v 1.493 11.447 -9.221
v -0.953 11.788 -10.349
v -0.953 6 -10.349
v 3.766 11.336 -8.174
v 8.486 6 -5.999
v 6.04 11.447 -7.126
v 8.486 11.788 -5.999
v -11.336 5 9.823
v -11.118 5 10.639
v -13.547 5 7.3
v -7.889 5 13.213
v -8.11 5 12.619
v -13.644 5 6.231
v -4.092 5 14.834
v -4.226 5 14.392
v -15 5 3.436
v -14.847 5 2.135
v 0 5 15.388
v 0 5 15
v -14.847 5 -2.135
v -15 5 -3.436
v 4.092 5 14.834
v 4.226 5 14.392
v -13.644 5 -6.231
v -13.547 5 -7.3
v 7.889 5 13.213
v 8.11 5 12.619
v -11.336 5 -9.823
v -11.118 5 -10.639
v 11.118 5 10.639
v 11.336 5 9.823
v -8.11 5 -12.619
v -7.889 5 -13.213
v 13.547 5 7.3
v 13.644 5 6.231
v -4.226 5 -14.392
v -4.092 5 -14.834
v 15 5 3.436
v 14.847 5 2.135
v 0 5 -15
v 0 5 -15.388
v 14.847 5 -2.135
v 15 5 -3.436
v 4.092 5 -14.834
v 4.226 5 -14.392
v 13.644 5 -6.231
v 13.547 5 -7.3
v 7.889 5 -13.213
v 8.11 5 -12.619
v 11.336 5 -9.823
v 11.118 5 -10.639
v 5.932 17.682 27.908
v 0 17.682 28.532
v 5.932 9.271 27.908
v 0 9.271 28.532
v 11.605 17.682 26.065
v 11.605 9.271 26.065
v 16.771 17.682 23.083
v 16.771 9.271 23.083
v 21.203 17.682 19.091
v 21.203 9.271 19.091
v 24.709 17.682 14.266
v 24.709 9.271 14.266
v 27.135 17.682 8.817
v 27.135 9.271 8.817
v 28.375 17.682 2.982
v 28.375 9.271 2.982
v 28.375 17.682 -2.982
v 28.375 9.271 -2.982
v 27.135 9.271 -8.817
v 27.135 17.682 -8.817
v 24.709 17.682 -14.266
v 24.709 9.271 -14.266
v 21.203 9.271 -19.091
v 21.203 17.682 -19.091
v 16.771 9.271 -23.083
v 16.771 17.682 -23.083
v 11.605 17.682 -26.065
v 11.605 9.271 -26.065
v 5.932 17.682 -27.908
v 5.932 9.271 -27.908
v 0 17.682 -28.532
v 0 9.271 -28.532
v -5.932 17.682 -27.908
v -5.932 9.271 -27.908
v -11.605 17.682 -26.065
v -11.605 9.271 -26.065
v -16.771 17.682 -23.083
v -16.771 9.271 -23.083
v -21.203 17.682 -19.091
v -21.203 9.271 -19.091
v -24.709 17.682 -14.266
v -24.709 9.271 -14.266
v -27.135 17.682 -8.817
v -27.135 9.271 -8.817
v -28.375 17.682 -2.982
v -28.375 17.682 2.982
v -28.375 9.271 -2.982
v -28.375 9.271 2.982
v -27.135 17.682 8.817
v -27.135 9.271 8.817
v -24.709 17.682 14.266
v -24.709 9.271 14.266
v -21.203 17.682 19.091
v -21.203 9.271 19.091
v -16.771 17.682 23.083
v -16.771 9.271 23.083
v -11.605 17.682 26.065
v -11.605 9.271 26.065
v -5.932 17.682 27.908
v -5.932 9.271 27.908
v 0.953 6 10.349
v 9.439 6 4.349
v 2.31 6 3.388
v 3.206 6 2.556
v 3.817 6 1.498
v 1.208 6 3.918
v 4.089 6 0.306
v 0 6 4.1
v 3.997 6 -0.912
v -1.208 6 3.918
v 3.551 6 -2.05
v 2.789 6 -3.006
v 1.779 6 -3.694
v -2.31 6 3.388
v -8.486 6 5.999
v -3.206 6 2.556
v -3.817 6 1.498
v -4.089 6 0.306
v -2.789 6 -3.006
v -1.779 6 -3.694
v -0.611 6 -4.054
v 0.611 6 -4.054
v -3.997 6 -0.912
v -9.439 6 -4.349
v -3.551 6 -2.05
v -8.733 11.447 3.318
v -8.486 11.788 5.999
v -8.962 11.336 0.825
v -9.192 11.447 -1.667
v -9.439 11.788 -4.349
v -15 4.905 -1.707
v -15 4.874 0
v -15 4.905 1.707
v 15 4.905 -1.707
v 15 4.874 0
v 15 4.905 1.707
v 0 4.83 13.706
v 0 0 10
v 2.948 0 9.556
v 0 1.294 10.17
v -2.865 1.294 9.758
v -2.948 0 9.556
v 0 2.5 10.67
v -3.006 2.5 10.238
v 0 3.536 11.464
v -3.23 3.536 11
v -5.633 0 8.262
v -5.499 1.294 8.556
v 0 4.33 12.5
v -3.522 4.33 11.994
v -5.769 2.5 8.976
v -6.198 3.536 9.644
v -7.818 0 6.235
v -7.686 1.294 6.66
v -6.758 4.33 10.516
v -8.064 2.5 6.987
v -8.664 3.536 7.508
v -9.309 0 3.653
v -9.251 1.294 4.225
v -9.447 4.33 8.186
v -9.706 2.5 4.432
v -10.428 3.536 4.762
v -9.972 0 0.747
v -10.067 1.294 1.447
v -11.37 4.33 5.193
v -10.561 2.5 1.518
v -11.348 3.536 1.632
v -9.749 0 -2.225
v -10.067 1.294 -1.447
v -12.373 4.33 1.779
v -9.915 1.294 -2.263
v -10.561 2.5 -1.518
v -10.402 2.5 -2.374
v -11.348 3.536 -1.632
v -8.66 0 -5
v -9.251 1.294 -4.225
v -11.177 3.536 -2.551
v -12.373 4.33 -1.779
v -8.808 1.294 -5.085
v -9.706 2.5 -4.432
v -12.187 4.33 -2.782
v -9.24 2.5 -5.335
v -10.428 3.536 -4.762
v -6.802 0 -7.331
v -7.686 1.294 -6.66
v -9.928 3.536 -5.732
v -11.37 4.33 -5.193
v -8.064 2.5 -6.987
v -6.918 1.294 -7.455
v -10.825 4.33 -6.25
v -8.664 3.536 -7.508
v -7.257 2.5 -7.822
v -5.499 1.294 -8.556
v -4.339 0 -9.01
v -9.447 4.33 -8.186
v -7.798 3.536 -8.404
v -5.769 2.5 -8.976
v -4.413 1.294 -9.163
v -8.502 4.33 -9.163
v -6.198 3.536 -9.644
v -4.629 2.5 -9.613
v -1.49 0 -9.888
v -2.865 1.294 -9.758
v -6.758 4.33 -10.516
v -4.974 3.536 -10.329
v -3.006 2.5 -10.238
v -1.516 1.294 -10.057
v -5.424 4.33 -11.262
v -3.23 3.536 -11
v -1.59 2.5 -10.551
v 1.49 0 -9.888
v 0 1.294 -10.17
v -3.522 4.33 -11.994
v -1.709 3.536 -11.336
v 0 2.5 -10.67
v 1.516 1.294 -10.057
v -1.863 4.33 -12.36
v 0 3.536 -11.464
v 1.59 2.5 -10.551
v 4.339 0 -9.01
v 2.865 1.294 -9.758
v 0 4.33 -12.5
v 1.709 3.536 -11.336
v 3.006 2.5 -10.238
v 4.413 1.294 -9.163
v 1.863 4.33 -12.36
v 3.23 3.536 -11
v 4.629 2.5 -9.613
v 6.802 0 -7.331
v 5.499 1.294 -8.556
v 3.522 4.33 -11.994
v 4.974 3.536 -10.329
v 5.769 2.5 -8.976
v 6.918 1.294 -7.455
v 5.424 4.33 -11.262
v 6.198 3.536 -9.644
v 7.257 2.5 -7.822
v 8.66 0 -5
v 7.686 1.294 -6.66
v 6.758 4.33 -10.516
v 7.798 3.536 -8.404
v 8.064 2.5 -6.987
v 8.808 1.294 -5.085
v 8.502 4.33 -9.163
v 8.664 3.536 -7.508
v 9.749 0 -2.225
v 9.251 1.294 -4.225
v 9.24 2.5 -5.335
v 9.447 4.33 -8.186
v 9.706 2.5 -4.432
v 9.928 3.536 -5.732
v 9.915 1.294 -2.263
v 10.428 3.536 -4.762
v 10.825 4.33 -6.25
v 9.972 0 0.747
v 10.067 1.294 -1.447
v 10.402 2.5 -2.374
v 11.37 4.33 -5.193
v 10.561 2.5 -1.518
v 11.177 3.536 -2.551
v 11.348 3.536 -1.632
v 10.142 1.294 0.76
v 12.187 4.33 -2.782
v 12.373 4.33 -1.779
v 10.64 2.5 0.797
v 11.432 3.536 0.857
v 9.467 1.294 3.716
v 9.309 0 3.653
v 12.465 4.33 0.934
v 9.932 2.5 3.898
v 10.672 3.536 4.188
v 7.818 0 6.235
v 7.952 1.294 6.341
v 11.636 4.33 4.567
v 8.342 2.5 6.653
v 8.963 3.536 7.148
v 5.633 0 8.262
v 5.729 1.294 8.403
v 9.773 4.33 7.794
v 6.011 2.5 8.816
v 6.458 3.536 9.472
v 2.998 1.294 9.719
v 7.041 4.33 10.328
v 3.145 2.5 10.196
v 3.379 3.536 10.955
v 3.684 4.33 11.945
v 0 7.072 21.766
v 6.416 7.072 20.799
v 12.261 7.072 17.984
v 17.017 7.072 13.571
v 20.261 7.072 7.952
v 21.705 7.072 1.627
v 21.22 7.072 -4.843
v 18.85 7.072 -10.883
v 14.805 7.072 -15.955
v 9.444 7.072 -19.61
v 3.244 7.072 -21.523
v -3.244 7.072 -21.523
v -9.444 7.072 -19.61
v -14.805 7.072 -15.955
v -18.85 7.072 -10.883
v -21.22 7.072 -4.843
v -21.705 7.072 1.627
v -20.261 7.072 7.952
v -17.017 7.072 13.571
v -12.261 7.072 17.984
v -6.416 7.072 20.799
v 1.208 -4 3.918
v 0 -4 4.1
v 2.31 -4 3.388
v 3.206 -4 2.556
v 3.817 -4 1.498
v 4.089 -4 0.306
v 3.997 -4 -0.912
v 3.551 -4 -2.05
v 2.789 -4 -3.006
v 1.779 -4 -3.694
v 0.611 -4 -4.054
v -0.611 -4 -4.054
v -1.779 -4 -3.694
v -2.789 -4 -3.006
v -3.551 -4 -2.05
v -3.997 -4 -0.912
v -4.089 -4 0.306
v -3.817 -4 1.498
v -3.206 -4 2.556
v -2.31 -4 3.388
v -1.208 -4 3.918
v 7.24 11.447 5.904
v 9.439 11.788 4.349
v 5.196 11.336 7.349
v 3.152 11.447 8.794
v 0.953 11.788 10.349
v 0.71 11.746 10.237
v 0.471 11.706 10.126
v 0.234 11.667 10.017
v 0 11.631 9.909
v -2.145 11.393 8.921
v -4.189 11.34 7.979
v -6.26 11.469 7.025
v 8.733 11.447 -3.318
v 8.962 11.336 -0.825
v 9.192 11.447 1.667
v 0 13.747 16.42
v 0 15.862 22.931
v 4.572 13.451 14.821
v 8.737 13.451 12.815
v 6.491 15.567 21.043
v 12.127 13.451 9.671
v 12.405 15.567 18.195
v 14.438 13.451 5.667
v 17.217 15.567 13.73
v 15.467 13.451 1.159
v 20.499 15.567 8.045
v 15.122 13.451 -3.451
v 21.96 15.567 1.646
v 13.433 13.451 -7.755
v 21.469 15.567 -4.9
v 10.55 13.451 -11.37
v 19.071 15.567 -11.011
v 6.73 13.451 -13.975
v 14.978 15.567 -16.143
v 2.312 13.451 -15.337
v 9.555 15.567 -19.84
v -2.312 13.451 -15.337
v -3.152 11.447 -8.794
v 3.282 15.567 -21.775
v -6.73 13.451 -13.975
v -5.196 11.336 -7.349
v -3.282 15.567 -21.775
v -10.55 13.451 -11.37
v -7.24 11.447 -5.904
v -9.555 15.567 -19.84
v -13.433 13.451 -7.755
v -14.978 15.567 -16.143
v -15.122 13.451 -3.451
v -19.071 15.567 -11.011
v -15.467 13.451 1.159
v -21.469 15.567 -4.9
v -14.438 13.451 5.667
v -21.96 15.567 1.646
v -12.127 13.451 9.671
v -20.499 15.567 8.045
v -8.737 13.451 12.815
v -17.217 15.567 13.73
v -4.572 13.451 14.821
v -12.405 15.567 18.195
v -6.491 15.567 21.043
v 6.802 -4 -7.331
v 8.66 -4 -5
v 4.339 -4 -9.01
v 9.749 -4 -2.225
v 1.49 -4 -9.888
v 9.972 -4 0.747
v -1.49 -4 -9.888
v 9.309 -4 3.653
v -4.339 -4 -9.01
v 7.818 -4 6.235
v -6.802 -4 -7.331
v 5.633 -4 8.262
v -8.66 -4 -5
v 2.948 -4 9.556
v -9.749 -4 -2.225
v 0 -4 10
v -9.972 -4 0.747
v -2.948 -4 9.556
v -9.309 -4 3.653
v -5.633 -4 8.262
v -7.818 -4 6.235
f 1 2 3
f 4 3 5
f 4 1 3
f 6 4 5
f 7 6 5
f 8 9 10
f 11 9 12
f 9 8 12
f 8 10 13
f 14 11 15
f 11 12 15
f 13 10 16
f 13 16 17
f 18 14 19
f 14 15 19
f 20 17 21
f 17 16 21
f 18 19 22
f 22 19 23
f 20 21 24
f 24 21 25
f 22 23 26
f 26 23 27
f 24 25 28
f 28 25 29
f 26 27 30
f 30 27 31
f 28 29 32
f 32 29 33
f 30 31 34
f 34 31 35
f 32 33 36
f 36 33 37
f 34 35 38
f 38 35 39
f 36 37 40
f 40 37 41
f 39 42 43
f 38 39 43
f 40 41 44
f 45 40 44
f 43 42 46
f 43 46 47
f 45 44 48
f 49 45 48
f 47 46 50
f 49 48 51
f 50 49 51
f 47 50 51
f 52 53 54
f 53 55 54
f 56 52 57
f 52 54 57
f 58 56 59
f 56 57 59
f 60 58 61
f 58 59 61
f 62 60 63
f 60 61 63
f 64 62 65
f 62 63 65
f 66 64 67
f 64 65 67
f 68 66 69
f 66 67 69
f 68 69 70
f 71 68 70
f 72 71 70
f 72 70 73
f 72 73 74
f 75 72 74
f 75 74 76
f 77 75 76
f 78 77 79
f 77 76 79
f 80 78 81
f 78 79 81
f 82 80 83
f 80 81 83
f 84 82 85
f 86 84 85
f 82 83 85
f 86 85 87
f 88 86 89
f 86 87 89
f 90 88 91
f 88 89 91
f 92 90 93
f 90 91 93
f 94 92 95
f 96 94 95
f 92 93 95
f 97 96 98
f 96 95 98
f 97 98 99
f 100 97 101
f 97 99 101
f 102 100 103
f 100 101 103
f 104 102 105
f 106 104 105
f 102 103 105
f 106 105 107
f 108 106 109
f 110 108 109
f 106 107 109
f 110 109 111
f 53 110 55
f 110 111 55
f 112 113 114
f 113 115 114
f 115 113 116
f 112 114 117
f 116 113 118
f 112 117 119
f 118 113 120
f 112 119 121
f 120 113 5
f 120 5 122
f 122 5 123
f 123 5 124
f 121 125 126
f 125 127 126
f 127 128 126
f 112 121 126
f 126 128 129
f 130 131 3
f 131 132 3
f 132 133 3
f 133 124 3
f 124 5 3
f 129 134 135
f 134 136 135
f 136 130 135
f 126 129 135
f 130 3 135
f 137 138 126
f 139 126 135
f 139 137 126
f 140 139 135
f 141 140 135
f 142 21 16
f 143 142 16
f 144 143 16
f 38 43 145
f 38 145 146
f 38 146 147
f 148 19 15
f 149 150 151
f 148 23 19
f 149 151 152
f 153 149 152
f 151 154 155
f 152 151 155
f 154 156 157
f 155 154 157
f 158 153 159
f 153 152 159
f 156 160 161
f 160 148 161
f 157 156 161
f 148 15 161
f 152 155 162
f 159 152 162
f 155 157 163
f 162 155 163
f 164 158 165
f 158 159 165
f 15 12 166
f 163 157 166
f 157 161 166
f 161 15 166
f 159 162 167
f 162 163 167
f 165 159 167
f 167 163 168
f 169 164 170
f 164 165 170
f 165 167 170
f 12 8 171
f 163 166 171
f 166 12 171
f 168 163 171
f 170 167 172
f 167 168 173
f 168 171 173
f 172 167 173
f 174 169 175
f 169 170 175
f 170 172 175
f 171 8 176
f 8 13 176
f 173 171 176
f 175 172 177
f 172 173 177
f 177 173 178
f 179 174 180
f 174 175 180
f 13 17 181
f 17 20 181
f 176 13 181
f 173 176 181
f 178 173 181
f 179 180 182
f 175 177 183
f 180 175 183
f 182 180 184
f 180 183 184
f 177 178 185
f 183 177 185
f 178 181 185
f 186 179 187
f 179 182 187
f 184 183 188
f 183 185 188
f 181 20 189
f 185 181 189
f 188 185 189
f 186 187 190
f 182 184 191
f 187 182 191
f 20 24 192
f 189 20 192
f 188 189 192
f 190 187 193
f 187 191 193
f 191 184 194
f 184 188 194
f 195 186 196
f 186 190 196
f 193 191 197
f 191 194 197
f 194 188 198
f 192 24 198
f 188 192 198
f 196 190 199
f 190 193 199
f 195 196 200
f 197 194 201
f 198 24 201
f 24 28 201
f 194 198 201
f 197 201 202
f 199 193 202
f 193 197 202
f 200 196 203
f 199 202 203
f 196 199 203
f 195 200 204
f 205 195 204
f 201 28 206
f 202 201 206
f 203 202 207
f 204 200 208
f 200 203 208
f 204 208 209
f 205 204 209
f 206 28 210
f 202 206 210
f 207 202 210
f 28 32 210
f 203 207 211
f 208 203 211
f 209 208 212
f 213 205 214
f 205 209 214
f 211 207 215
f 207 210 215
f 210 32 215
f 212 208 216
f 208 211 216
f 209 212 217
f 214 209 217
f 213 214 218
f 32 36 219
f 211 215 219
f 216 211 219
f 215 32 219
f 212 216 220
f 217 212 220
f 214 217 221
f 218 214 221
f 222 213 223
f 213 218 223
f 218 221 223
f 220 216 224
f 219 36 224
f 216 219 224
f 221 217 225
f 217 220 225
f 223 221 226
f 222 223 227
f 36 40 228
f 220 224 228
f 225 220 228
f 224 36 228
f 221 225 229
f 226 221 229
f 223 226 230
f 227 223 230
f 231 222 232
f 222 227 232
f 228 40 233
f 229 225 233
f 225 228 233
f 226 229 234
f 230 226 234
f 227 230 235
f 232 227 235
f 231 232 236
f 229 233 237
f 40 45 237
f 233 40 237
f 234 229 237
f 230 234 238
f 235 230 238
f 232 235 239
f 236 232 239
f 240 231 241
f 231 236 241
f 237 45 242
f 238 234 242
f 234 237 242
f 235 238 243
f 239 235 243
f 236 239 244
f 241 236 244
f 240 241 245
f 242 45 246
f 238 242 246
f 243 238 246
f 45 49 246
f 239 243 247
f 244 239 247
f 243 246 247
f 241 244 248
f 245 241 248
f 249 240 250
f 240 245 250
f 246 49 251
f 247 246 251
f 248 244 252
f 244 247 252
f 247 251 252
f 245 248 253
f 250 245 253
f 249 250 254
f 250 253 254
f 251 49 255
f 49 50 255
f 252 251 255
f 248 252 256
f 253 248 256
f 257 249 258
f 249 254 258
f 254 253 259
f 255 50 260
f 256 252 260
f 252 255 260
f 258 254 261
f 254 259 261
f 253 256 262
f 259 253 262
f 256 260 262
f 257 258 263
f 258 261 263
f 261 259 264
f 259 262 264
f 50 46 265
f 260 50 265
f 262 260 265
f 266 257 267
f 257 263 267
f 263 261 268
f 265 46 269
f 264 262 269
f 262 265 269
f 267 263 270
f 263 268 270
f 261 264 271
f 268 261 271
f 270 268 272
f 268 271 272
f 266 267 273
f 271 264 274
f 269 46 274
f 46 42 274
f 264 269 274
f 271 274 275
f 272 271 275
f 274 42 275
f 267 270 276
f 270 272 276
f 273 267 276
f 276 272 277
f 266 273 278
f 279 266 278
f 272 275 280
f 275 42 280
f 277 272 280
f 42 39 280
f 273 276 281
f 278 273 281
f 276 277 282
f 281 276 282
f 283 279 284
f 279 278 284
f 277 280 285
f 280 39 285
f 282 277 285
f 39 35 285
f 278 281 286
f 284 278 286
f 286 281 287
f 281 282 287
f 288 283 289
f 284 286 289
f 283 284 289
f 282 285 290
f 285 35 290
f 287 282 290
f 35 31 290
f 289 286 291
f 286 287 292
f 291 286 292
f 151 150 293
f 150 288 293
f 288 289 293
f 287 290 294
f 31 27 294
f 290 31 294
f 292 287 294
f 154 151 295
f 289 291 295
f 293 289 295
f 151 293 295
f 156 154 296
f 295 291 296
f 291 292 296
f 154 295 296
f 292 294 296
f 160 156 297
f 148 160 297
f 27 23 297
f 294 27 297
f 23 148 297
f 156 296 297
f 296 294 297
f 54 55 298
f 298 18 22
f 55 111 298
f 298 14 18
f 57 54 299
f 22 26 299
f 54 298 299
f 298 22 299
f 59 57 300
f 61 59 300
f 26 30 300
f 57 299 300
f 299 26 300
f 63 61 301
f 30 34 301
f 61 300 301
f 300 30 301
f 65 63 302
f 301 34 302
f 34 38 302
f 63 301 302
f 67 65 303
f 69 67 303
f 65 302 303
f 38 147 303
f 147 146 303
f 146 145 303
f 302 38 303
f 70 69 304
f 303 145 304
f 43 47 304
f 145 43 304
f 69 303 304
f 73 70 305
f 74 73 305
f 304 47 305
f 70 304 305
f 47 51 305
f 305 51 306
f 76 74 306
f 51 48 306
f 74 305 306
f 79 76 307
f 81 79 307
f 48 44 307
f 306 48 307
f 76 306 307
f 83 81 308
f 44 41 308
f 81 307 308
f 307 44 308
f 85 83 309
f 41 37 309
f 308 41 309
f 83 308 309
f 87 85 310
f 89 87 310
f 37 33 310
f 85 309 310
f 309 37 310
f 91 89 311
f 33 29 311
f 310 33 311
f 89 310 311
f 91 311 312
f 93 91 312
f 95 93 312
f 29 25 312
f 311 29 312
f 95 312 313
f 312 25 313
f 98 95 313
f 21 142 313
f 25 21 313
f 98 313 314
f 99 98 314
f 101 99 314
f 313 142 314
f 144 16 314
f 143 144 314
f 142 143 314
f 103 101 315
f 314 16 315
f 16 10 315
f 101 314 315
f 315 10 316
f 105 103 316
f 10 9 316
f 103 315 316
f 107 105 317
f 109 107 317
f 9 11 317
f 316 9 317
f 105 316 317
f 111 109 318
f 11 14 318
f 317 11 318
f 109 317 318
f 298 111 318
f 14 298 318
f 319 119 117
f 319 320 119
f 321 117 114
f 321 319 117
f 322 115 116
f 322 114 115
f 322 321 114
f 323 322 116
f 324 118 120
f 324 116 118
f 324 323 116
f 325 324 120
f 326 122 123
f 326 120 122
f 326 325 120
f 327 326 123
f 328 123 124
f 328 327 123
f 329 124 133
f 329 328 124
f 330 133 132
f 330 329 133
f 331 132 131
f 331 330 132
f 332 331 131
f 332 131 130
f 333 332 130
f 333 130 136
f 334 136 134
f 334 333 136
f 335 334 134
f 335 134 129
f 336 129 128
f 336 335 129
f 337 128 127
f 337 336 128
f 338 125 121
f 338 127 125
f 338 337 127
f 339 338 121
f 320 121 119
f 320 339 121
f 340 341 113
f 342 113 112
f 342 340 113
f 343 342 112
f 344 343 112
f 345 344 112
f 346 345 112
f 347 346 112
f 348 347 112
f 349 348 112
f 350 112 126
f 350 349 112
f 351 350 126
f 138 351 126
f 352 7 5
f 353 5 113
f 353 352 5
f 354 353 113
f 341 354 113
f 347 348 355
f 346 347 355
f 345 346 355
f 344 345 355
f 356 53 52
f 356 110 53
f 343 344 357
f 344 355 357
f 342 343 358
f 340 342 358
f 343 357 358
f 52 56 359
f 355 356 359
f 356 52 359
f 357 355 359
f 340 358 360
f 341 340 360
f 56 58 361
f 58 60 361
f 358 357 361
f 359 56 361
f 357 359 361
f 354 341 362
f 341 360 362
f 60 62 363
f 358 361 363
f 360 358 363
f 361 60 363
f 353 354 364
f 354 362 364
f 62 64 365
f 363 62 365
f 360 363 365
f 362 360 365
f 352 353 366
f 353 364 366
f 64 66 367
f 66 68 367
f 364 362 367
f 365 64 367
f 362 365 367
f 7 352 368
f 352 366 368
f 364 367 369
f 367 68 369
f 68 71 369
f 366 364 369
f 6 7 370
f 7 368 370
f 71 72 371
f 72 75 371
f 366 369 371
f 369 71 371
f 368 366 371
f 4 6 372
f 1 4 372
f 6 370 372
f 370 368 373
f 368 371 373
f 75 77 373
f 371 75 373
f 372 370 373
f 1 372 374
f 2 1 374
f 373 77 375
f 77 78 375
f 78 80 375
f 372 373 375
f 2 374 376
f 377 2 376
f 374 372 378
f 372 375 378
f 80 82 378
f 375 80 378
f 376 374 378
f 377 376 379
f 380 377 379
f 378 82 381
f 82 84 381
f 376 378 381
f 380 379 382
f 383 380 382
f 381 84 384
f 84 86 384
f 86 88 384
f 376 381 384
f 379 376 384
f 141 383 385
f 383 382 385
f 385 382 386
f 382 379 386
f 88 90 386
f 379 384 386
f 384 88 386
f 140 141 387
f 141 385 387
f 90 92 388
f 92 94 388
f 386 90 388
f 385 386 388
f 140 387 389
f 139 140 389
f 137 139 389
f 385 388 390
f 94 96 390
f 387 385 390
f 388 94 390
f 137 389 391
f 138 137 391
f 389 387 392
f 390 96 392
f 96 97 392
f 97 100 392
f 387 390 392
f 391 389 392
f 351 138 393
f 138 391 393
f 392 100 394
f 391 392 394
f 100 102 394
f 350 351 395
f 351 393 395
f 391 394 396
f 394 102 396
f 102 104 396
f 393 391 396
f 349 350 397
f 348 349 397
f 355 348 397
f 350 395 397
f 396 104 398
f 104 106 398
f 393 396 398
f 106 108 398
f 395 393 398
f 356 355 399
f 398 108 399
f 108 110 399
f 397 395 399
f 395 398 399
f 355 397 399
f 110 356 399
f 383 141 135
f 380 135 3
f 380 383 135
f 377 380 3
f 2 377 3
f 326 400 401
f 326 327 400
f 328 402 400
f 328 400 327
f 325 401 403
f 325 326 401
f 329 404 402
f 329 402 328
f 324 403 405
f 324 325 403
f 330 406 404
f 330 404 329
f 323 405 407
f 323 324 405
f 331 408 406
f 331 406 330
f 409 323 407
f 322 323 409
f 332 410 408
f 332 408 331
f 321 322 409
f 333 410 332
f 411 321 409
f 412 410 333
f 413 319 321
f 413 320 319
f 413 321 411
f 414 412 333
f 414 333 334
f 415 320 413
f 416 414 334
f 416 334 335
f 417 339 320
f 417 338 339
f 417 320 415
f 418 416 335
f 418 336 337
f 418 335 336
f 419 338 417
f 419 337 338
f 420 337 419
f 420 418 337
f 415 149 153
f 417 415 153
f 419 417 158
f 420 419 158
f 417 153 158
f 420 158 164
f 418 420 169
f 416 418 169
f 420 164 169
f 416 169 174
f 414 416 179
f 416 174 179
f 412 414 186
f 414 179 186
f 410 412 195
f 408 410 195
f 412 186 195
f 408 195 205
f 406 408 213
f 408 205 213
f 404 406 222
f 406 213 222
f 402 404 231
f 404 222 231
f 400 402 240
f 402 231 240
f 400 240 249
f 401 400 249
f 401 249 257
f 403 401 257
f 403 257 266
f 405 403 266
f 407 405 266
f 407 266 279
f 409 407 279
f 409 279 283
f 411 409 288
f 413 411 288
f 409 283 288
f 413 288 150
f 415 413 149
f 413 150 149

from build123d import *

# Parameters (mm, degrees)
CUT_EXTRUDE_1_DEPTH      = 45.054236589
CUT_EXTRUDE_1_DEPTH_BACK = 45.054236589
SKETCH_2_W               = 30
SKETCH_2_H               = 10
SKETCH_3_R               = 3
CUT_EXTRUDE_2_DEPTH      = 43.296024461
SKETCH_5_R               = 10
EXTRUDE_1_DEPTH          = 9
CUT_EXTRUDE_7_DEPTH      = 43.296024461
CUT_EXTRUDE_7_DEPTH_BACK = 43.296024461
SKETCH_6_R               = 4.1
FILLET_2_R               = 5
CUT_EXTRUDE_8_DEPTH      = 4
CUT_EXTRUDE_8_DEPTH_BACK = 12


with BuildPart() as part:
    # 草图1 → 旋转2 (revolve)
    with BuildSketch(Plane.XY, mode=Mode.PRIVATE) as revolve_2_sk:
        Polygon((0, 0), (0, 8.411697794), (28.531695489, 17.682207625), (28.531695489, 9.270509831), align=None)
    revolve(revolve_2_sk.sketch.rotate(Axis((0, 0, 0), (0, 1, 0)), 270), axis=Axis((0, 0, 0), (0, 1, 0)))

    # 草图2 → 切除-拉伸1 (cut, two sides: drawn at the far end of the back side and taken through both)
    with BuildSketch(Plane.XY.offset(-CUT_EXTRUDE_1_DEPTH_BACK)):
        Rectangle(SKETCH_2_W, SKETCH_2_H)
    extrude(amount=CUT_EXTRUDE_1_DEPTH + CUT_EXTRUDE_1_DEPTH_BACK, mode=Mode.SUBTRACT)

    # 草图3 → 切除-拉伸2 (cut, through all)
    with BuildSketch(Plane.XZ.offset(-5)):
        with Locations(Location((0, 0, 0), (0, 0, 270))):
            Circle(SKETCH_3_R)
    extrude(amount=-CUT_EXTRUDE_2_DEPTH, mode=Mode.SUBTRACT)

    # 草图5 → 凸台-拉伸1 (add)
    with BuildSketch(Plane.XZ.offset(-5)):
        with Locations(Location((0, 0, 0), (0, 0, 90))):
            Circle(SKETCH_5_R)
    extrude(amount=EXTRUDE_1_DEPTH)

    # 草图6 → 切除-拉伸7 (cut, two sides: drawn at the far end of the back side and taken through both)
    with BuildSketch(Plane(origin=(0, 5, 0), x_dir=(1, 0, 0), z_dir=(0, 1, 0)).offset(-CUT_EXTRUDE_7_DEPTH_BACK)):
        with Locations(Location((0, 0, 0), (0, 0, 270))):
            Circle(SKETCH_6_R)
    extrude(amount=CUT_EXTRUDE_7_DEPTH + CUT_EXTRUDE_7_DEPTH_BACK, mode=Mode.SUBTRACT)

    # 圆角2
    fillet_2_edges = [part.edges().sort_by_distance(p)[0] for p in [
        (0, 5, -10),
    ]]
    fillet(fillet_2_edges, radius=FILLET_2_R - 0.0001)  # a hair under: the kernel refuses the full size

    # 草图9 → 切除-拉伸8 (cut, two sides: drawn at the far end of the back side and taken through both)
    with BuildSketch(Plane(origin=(0, 10, 0), x_dir=(-1, 0, 0), z_dir=(0, -1, 0)).offset(-CUT_EXTRUDE_8_DEPTH_BACK)):
        Polygon((8.48568544, -5.999428524), (9.43850023, 4.349104898), (0.95281479, 10.348533422), (-8.48568544, 5.999428524), (-9.43850023, -4.349104898), (-0.95281479, -10.348533422), align=None)
    extrude(amount=CUT_EXTRUDE_8_DEPTH + CUT_EXTRUDE_8_DEPTH_BACK, mode=Mode.SUBTRACT)


solid = part.part
